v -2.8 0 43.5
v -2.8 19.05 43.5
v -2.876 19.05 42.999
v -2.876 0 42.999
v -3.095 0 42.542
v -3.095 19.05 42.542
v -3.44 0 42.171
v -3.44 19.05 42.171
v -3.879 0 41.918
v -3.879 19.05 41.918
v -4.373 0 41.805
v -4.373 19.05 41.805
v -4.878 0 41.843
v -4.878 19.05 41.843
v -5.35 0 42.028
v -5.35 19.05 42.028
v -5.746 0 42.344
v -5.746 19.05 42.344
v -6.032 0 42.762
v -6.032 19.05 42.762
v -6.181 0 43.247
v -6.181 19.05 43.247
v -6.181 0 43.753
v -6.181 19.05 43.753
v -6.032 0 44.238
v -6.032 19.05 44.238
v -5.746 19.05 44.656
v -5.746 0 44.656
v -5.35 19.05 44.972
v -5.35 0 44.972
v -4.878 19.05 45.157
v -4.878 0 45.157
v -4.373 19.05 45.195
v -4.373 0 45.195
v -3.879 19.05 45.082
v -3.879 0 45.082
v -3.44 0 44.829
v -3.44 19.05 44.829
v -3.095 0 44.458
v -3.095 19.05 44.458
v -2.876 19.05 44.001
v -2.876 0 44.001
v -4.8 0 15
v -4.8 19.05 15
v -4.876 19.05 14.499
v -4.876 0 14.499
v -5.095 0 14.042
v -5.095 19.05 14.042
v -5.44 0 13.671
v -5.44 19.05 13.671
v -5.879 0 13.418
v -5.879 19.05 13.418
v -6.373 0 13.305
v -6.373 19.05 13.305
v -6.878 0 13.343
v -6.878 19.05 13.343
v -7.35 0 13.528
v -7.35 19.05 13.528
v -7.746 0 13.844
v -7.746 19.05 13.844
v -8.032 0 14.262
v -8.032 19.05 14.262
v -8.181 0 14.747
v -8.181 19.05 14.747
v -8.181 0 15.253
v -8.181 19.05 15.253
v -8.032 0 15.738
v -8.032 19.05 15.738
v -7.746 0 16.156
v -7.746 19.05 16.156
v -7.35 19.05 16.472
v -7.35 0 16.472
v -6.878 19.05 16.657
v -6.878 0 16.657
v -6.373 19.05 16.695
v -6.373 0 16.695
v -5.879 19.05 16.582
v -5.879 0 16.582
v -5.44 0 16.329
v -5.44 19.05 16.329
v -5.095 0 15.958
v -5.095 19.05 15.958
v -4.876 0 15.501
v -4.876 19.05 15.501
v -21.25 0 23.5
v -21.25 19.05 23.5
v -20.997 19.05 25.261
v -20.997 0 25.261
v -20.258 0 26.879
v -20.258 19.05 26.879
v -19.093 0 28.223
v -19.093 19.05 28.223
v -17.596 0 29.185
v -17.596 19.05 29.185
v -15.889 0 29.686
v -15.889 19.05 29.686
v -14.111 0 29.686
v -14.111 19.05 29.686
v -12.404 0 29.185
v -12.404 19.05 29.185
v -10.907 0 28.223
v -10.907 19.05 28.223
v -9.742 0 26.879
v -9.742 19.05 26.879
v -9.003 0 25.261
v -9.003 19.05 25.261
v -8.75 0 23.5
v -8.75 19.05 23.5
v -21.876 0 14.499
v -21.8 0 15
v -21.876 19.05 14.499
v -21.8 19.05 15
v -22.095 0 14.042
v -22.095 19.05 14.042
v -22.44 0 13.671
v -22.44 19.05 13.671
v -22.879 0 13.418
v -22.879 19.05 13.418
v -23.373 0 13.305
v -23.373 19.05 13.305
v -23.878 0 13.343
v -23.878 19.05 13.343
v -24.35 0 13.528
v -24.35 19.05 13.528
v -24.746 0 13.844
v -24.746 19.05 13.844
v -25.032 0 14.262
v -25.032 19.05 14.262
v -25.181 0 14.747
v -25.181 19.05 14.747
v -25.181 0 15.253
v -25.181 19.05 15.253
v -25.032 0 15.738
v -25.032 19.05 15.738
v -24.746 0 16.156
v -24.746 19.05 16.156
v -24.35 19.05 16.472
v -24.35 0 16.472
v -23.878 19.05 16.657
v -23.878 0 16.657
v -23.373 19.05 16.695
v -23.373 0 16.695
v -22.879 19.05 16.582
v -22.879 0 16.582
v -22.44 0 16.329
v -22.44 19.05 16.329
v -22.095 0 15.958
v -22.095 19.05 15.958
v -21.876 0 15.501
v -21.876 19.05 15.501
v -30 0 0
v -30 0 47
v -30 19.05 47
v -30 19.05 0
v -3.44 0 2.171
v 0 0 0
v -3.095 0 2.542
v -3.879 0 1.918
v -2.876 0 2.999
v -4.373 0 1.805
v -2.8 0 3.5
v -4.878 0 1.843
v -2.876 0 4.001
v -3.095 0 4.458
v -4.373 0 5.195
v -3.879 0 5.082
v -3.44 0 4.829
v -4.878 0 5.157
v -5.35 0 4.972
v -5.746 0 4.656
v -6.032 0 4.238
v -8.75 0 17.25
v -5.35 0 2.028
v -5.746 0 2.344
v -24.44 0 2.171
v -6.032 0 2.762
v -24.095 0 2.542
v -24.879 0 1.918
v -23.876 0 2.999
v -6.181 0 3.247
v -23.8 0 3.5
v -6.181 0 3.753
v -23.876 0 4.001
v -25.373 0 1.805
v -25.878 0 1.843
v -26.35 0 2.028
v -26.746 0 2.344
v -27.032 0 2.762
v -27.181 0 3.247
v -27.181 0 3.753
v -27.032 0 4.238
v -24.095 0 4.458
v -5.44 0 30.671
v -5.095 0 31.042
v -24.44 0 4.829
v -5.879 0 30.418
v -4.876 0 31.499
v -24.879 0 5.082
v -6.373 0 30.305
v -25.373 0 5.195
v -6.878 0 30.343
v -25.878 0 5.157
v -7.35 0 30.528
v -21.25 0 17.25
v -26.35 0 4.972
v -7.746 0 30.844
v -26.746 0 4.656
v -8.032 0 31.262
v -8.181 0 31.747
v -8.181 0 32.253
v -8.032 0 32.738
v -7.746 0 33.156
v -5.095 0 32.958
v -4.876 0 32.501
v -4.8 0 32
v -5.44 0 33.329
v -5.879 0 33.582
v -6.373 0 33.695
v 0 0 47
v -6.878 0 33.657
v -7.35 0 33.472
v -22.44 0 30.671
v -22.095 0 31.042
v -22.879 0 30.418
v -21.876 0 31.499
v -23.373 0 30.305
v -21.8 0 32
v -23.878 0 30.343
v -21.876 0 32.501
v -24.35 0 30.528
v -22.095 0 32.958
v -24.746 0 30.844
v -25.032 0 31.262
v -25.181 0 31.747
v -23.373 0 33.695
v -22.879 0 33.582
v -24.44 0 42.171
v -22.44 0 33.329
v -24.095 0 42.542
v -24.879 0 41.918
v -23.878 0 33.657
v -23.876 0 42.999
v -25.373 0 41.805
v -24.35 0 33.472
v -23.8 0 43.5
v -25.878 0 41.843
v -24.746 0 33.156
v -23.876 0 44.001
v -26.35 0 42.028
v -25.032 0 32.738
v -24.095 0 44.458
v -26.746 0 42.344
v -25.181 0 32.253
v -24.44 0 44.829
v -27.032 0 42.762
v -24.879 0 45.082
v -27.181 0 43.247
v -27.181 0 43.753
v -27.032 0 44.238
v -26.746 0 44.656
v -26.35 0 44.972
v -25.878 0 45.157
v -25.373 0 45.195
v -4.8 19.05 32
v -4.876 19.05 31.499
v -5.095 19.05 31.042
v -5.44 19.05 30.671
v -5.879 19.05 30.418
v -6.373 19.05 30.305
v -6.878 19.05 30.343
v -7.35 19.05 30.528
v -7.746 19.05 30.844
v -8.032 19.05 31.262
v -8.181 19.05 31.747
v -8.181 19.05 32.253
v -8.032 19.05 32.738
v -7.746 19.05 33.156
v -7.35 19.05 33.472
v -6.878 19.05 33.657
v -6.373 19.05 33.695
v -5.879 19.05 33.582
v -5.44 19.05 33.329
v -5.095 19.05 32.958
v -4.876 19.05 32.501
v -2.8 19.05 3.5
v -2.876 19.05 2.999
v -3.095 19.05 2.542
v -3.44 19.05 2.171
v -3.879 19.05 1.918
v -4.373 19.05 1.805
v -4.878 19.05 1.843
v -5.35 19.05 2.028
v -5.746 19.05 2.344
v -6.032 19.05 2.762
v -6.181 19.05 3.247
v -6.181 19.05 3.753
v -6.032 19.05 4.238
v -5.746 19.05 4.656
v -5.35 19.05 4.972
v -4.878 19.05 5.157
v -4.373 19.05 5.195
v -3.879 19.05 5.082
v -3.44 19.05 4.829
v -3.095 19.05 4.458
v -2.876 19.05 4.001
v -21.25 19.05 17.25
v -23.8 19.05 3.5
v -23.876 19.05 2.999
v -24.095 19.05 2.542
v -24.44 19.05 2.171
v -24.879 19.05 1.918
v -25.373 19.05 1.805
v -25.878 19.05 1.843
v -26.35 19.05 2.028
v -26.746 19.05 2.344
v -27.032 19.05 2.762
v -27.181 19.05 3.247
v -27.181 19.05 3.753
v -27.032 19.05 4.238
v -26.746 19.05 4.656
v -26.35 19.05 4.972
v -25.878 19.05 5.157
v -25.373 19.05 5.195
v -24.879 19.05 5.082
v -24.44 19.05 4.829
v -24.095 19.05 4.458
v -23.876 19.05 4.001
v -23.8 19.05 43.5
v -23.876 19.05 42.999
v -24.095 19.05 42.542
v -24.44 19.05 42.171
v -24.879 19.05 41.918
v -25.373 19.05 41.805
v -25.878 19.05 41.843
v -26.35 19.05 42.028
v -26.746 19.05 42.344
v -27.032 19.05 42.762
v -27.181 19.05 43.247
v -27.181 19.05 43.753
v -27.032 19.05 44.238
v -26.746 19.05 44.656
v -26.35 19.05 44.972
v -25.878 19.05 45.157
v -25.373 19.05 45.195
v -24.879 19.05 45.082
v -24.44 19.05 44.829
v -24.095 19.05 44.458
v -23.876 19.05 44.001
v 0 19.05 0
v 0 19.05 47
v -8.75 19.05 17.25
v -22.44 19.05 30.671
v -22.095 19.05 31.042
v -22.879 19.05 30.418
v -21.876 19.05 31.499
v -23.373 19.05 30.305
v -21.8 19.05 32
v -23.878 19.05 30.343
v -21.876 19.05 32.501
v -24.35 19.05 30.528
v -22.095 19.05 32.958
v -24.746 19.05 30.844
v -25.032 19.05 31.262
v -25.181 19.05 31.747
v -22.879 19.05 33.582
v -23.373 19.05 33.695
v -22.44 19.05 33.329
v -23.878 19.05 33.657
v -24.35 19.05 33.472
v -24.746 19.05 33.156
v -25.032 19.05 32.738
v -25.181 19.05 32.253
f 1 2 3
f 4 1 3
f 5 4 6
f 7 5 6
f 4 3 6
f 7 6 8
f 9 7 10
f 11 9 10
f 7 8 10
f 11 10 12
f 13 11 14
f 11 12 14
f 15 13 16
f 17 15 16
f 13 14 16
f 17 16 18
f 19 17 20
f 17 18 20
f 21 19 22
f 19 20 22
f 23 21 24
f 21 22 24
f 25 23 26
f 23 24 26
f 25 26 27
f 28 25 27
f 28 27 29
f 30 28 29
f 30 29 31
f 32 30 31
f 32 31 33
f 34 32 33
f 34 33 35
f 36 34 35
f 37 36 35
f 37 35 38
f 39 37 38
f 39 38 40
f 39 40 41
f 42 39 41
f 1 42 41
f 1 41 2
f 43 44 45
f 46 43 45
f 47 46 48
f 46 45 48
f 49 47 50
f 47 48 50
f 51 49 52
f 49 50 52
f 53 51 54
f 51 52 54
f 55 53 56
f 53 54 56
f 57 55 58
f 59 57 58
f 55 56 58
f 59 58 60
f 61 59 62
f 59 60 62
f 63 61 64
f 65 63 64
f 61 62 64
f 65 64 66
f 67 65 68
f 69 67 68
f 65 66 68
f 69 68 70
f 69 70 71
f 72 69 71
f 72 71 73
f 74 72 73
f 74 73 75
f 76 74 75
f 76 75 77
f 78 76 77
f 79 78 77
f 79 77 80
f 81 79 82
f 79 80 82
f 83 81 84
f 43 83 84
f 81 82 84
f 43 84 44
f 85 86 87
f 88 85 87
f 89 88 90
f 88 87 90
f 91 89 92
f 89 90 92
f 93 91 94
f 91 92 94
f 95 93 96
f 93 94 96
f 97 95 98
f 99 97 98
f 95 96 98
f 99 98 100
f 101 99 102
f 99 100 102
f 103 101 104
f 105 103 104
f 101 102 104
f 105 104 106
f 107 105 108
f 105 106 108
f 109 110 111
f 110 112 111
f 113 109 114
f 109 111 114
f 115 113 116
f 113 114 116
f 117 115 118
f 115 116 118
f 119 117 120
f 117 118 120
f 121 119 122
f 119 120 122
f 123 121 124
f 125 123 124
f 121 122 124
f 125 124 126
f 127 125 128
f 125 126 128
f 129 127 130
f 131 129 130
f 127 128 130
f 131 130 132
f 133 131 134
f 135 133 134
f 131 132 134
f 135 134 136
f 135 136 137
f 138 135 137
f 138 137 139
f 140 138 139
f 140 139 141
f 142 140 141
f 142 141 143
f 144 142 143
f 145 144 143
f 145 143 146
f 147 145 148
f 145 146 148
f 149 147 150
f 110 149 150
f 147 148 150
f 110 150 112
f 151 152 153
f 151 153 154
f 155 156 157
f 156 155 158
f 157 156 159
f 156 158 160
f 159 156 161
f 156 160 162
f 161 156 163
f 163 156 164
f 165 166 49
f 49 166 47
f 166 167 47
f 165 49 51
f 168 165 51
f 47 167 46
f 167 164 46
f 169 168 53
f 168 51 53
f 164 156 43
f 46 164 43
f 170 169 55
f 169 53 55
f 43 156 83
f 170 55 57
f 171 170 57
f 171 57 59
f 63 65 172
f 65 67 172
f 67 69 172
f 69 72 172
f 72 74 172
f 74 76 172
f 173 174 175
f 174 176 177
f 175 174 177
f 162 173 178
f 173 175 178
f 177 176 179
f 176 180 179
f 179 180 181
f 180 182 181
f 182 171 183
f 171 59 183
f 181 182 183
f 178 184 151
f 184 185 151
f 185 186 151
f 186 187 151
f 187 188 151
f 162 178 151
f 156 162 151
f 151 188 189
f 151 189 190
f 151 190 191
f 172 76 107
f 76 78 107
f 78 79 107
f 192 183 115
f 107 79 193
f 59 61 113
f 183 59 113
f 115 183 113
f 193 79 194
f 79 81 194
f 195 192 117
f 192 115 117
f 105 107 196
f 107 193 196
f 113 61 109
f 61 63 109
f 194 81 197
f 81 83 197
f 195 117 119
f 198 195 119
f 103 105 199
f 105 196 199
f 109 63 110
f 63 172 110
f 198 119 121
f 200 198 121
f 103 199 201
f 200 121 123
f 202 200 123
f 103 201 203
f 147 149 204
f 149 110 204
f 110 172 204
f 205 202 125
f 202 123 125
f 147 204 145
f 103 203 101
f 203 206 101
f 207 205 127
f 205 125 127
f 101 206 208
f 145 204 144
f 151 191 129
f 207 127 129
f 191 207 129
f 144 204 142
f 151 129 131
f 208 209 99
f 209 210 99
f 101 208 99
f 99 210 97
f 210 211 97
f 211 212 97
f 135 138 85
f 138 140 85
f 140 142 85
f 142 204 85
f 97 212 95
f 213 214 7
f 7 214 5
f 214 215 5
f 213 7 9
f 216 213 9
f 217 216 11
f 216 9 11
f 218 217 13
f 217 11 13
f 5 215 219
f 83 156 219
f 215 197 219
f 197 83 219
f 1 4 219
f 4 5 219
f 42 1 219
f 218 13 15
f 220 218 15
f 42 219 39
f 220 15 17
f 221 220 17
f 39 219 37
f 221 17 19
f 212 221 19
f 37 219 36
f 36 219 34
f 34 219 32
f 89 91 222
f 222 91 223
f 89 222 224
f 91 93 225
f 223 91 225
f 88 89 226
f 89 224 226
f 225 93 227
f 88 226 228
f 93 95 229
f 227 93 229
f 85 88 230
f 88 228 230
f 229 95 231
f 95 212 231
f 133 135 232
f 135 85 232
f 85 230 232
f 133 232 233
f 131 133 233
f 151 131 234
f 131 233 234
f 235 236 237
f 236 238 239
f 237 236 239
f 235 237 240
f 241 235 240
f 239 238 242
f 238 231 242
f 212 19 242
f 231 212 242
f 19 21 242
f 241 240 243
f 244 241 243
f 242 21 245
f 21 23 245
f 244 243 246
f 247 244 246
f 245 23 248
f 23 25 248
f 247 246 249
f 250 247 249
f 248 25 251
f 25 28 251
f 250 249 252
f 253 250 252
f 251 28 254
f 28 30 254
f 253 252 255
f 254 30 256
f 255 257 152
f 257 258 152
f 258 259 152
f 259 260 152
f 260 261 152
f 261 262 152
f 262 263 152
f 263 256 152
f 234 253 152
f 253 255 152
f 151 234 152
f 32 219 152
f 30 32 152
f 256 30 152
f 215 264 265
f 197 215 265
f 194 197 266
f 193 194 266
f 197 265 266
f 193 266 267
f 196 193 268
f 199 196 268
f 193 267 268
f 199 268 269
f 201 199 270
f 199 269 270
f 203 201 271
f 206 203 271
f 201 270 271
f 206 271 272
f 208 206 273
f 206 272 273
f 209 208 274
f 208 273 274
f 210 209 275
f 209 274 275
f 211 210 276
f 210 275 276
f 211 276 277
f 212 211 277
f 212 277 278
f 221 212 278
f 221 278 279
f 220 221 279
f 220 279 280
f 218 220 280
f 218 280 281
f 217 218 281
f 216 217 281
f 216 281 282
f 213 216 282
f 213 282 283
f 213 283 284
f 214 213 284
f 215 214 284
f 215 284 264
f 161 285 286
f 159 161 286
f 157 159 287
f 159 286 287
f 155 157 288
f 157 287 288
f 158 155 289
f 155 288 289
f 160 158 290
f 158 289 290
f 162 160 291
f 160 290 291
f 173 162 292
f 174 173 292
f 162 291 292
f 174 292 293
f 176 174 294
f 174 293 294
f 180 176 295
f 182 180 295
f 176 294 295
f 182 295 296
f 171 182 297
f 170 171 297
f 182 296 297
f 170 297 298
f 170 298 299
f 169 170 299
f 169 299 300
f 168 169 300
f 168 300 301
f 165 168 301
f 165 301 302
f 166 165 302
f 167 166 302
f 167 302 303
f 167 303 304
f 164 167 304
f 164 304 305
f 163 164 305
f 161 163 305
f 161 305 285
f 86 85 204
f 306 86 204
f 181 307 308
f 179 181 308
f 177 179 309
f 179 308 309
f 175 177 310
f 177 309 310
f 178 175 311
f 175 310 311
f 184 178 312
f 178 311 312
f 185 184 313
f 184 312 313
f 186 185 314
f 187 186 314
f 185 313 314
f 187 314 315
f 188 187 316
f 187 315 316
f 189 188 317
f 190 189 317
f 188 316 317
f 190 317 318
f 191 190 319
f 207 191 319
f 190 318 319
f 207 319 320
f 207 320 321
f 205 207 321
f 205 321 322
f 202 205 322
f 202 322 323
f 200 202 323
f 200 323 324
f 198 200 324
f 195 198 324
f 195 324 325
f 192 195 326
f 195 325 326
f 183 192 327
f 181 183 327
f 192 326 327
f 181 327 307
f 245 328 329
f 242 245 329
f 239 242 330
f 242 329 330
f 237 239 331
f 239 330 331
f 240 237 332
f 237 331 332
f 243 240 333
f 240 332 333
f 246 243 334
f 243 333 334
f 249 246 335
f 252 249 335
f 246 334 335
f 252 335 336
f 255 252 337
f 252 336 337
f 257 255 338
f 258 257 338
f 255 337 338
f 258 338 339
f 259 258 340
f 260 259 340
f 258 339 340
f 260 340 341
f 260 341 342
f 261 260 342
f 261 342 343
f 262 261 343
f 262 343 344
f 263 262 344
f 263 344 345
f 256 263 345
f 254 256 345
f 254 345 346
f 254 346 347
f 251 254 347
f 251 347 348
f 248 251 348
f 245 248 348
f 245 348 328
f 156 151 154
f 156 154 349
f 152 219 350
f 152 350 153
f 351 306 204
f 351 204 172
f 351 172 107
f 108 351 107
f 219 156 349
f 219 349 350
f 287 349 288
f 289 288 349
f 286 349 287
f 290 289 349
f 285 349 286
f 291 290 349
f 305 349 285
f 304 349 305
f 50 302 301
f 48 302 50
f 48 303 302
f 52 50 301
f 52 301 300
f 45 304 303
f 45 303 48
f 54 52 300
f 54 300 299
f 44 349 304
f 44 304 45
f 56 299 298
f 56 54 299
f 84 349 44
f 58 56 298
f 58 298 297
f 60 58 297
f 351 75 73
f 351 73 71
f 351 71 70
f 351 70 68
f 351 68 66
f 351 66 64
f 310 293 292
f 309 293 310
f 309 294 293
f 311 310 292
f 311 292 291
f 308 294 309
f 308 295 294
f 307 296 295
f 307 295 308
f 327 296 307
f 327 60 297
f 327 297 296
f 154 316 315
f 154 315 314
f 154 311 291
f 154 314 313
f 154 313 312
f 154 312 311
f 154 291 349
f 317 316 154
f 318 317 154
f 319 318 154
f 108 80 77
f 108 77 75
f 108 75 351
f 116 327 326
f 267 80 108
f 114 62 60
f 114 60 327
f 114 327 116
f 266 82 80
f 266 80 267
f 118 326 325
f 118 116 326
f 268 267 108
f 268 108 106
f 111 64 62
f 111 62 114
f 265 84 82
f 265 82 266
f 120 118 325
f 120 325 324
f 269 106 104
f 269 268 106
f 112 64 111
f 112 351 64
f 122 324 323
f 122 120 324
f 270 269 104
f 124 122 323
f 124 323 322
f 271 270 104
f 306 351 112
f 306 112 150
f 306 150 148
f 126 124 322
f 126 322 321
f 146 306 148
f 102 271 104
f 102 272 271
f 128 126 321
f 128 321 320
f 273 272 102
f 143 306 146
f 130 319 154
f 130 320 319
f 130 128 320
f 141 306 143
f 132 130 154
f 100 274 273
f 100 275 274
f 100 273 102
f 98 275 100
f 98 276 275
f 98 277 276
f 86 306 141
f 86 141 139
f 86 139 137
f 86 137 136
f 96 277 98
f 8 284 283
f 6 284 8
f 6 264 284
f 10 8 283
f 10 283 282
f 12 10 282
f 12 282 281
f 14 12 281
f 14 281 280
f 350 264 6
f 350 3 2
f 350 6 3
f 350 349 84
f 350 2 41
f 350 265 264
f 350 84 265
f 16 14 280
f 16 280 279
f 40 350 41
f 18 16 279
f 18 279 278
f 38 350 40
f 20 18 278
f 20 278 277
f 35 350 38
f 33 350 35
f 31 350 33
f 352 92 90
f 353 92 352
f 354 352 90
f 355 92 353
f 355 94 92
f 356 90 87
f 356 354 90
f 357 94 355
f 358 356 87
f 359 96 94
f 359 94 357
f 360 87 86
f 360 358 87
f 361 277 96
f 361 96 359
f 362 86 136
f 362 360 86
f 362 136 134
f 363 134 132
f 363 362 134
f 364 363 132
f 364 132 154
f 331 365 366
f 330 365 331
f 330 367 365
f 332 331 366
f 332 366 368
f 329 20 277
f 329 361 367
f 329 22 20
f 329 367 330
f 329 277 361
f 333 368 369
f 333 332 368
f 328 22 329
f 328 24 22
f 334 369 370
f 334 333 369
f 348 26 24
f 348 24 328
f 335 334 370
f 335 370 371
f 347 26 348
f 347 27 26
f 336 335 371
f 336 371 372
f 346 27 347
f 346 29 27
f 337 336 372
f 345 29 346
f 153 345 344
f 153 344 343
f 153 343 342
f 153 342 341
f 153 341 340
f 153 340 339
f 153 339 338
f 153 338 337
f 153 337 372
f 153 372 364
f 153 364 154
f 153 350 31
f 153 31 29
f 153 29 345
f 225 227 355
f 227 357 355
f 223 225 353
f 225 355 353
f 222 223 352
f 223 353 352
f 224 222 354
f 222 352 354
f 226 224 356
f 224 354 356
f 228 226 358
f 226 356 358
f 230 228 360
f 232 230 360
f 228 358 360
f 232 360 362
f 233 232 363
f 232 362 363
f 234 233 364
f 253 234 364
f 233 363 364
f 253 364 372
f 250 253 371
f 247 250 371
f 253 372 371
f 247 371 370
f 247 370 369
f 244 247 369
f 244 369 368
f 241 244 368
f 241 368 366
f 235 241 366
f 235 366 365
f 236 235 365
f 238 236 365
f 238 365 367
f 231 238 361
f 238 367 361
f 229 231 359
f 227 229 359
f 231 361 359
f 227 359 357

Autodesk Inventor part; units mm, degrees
ref_plane "YZ Plane" through (0, 0, 0) normal (1, 0, 0) x (0, 1, 0)
ref_plane "XZ Plane" through (0, 0, 0) normal (0, 1, 0) x (-1, 0, 0)
ref_plane "XY Plane" through (0, 0, 0) normal (0, 0, 1) x (1, 0, 0)
sketch "Sketch1" plane through (0, 0, 0) normal (0, 1, 0) x (-1, 0, 0)
  line L0 (0, 0) -> (0, 47)
  line L1 (0, 47) -> (30, 47)
  line L2 (30, 47) -> (30, 0)
  line L3 (30, 0) -> (0, 0)
  dimension "d0" = 47
  dimension "d1" = 30
extrude "Extrusion1" add sketch "Sketch1" along normal blind 19.05
sketch "Sketch2" plane through (0, 19.05, 0) normal (0, 1, 0) x (1, 0, 0)
  line L0 (-30, 0) -> (-30, -47) construction
  line L1 (0, 0) -> (-30, 0) construction
  circle A0 centre (-25.5, -43.5) radius 1.7
  circle A1 centre (-4.5, -43.5) radius 1.7
  circle A2 centre (-23.5, -32) radius 1.7
  circle A3 centre (-6.5, -32) radius 1.7
  circle A4 centre (-23.5, -15) radius 1.7
  circle A5 centre (-25.5, -3.5) radius 1.7
  circle A6 centre (-4.5, -3.5) radius 1.7
  circle A7 centre (-6.5, -15) radius 1.7
  line L2 (-23.5, -32) -> (-23.5, -15)
  line L3 (-23.5, -15) -> (-6.5, -15)
  line L4 (-25.5, -43.5) -> (-25.5, -3.5)
  line L5 (-25.5, -3.5) -> (-4.5, -3.5)
  circle A8 centre (-15, -23.5) radius 6.25
  line L6 (-21.25, -23.5) -> (-21.25, -17.25)
  line L7 (-21.25, -17.25) -> (-8.75, -17.25)
  line L8 (-8.75, -17.25) -> (-8.75, -23.5)
  point P0 (-25.5, -23.5)
  point P1 (-30, -23.5)
  point P2 (-23.5, -23.5)
  point P3 (-30, -23.5)
  point P4 (-15, -3.5)
  point P5 (-15, 0)
  point P6 (-15, -15)
  point P7 (-15, 0)
  point P8 (-15, 0)
  point P9 (-30, -23.5)
  point P10 (-15, -17.25)
  dimension "d4" = 3.4
  dimension "d5" = 17
  dimension "d6" = 17
  dimension "d7" = 40
  dimension "d8" = 21
  dimension "d9" = 12.5
extrude "Extrusion2" cut sketch "Sketch2" against normal through all
properties part number "HopefullyHelpsMount"
